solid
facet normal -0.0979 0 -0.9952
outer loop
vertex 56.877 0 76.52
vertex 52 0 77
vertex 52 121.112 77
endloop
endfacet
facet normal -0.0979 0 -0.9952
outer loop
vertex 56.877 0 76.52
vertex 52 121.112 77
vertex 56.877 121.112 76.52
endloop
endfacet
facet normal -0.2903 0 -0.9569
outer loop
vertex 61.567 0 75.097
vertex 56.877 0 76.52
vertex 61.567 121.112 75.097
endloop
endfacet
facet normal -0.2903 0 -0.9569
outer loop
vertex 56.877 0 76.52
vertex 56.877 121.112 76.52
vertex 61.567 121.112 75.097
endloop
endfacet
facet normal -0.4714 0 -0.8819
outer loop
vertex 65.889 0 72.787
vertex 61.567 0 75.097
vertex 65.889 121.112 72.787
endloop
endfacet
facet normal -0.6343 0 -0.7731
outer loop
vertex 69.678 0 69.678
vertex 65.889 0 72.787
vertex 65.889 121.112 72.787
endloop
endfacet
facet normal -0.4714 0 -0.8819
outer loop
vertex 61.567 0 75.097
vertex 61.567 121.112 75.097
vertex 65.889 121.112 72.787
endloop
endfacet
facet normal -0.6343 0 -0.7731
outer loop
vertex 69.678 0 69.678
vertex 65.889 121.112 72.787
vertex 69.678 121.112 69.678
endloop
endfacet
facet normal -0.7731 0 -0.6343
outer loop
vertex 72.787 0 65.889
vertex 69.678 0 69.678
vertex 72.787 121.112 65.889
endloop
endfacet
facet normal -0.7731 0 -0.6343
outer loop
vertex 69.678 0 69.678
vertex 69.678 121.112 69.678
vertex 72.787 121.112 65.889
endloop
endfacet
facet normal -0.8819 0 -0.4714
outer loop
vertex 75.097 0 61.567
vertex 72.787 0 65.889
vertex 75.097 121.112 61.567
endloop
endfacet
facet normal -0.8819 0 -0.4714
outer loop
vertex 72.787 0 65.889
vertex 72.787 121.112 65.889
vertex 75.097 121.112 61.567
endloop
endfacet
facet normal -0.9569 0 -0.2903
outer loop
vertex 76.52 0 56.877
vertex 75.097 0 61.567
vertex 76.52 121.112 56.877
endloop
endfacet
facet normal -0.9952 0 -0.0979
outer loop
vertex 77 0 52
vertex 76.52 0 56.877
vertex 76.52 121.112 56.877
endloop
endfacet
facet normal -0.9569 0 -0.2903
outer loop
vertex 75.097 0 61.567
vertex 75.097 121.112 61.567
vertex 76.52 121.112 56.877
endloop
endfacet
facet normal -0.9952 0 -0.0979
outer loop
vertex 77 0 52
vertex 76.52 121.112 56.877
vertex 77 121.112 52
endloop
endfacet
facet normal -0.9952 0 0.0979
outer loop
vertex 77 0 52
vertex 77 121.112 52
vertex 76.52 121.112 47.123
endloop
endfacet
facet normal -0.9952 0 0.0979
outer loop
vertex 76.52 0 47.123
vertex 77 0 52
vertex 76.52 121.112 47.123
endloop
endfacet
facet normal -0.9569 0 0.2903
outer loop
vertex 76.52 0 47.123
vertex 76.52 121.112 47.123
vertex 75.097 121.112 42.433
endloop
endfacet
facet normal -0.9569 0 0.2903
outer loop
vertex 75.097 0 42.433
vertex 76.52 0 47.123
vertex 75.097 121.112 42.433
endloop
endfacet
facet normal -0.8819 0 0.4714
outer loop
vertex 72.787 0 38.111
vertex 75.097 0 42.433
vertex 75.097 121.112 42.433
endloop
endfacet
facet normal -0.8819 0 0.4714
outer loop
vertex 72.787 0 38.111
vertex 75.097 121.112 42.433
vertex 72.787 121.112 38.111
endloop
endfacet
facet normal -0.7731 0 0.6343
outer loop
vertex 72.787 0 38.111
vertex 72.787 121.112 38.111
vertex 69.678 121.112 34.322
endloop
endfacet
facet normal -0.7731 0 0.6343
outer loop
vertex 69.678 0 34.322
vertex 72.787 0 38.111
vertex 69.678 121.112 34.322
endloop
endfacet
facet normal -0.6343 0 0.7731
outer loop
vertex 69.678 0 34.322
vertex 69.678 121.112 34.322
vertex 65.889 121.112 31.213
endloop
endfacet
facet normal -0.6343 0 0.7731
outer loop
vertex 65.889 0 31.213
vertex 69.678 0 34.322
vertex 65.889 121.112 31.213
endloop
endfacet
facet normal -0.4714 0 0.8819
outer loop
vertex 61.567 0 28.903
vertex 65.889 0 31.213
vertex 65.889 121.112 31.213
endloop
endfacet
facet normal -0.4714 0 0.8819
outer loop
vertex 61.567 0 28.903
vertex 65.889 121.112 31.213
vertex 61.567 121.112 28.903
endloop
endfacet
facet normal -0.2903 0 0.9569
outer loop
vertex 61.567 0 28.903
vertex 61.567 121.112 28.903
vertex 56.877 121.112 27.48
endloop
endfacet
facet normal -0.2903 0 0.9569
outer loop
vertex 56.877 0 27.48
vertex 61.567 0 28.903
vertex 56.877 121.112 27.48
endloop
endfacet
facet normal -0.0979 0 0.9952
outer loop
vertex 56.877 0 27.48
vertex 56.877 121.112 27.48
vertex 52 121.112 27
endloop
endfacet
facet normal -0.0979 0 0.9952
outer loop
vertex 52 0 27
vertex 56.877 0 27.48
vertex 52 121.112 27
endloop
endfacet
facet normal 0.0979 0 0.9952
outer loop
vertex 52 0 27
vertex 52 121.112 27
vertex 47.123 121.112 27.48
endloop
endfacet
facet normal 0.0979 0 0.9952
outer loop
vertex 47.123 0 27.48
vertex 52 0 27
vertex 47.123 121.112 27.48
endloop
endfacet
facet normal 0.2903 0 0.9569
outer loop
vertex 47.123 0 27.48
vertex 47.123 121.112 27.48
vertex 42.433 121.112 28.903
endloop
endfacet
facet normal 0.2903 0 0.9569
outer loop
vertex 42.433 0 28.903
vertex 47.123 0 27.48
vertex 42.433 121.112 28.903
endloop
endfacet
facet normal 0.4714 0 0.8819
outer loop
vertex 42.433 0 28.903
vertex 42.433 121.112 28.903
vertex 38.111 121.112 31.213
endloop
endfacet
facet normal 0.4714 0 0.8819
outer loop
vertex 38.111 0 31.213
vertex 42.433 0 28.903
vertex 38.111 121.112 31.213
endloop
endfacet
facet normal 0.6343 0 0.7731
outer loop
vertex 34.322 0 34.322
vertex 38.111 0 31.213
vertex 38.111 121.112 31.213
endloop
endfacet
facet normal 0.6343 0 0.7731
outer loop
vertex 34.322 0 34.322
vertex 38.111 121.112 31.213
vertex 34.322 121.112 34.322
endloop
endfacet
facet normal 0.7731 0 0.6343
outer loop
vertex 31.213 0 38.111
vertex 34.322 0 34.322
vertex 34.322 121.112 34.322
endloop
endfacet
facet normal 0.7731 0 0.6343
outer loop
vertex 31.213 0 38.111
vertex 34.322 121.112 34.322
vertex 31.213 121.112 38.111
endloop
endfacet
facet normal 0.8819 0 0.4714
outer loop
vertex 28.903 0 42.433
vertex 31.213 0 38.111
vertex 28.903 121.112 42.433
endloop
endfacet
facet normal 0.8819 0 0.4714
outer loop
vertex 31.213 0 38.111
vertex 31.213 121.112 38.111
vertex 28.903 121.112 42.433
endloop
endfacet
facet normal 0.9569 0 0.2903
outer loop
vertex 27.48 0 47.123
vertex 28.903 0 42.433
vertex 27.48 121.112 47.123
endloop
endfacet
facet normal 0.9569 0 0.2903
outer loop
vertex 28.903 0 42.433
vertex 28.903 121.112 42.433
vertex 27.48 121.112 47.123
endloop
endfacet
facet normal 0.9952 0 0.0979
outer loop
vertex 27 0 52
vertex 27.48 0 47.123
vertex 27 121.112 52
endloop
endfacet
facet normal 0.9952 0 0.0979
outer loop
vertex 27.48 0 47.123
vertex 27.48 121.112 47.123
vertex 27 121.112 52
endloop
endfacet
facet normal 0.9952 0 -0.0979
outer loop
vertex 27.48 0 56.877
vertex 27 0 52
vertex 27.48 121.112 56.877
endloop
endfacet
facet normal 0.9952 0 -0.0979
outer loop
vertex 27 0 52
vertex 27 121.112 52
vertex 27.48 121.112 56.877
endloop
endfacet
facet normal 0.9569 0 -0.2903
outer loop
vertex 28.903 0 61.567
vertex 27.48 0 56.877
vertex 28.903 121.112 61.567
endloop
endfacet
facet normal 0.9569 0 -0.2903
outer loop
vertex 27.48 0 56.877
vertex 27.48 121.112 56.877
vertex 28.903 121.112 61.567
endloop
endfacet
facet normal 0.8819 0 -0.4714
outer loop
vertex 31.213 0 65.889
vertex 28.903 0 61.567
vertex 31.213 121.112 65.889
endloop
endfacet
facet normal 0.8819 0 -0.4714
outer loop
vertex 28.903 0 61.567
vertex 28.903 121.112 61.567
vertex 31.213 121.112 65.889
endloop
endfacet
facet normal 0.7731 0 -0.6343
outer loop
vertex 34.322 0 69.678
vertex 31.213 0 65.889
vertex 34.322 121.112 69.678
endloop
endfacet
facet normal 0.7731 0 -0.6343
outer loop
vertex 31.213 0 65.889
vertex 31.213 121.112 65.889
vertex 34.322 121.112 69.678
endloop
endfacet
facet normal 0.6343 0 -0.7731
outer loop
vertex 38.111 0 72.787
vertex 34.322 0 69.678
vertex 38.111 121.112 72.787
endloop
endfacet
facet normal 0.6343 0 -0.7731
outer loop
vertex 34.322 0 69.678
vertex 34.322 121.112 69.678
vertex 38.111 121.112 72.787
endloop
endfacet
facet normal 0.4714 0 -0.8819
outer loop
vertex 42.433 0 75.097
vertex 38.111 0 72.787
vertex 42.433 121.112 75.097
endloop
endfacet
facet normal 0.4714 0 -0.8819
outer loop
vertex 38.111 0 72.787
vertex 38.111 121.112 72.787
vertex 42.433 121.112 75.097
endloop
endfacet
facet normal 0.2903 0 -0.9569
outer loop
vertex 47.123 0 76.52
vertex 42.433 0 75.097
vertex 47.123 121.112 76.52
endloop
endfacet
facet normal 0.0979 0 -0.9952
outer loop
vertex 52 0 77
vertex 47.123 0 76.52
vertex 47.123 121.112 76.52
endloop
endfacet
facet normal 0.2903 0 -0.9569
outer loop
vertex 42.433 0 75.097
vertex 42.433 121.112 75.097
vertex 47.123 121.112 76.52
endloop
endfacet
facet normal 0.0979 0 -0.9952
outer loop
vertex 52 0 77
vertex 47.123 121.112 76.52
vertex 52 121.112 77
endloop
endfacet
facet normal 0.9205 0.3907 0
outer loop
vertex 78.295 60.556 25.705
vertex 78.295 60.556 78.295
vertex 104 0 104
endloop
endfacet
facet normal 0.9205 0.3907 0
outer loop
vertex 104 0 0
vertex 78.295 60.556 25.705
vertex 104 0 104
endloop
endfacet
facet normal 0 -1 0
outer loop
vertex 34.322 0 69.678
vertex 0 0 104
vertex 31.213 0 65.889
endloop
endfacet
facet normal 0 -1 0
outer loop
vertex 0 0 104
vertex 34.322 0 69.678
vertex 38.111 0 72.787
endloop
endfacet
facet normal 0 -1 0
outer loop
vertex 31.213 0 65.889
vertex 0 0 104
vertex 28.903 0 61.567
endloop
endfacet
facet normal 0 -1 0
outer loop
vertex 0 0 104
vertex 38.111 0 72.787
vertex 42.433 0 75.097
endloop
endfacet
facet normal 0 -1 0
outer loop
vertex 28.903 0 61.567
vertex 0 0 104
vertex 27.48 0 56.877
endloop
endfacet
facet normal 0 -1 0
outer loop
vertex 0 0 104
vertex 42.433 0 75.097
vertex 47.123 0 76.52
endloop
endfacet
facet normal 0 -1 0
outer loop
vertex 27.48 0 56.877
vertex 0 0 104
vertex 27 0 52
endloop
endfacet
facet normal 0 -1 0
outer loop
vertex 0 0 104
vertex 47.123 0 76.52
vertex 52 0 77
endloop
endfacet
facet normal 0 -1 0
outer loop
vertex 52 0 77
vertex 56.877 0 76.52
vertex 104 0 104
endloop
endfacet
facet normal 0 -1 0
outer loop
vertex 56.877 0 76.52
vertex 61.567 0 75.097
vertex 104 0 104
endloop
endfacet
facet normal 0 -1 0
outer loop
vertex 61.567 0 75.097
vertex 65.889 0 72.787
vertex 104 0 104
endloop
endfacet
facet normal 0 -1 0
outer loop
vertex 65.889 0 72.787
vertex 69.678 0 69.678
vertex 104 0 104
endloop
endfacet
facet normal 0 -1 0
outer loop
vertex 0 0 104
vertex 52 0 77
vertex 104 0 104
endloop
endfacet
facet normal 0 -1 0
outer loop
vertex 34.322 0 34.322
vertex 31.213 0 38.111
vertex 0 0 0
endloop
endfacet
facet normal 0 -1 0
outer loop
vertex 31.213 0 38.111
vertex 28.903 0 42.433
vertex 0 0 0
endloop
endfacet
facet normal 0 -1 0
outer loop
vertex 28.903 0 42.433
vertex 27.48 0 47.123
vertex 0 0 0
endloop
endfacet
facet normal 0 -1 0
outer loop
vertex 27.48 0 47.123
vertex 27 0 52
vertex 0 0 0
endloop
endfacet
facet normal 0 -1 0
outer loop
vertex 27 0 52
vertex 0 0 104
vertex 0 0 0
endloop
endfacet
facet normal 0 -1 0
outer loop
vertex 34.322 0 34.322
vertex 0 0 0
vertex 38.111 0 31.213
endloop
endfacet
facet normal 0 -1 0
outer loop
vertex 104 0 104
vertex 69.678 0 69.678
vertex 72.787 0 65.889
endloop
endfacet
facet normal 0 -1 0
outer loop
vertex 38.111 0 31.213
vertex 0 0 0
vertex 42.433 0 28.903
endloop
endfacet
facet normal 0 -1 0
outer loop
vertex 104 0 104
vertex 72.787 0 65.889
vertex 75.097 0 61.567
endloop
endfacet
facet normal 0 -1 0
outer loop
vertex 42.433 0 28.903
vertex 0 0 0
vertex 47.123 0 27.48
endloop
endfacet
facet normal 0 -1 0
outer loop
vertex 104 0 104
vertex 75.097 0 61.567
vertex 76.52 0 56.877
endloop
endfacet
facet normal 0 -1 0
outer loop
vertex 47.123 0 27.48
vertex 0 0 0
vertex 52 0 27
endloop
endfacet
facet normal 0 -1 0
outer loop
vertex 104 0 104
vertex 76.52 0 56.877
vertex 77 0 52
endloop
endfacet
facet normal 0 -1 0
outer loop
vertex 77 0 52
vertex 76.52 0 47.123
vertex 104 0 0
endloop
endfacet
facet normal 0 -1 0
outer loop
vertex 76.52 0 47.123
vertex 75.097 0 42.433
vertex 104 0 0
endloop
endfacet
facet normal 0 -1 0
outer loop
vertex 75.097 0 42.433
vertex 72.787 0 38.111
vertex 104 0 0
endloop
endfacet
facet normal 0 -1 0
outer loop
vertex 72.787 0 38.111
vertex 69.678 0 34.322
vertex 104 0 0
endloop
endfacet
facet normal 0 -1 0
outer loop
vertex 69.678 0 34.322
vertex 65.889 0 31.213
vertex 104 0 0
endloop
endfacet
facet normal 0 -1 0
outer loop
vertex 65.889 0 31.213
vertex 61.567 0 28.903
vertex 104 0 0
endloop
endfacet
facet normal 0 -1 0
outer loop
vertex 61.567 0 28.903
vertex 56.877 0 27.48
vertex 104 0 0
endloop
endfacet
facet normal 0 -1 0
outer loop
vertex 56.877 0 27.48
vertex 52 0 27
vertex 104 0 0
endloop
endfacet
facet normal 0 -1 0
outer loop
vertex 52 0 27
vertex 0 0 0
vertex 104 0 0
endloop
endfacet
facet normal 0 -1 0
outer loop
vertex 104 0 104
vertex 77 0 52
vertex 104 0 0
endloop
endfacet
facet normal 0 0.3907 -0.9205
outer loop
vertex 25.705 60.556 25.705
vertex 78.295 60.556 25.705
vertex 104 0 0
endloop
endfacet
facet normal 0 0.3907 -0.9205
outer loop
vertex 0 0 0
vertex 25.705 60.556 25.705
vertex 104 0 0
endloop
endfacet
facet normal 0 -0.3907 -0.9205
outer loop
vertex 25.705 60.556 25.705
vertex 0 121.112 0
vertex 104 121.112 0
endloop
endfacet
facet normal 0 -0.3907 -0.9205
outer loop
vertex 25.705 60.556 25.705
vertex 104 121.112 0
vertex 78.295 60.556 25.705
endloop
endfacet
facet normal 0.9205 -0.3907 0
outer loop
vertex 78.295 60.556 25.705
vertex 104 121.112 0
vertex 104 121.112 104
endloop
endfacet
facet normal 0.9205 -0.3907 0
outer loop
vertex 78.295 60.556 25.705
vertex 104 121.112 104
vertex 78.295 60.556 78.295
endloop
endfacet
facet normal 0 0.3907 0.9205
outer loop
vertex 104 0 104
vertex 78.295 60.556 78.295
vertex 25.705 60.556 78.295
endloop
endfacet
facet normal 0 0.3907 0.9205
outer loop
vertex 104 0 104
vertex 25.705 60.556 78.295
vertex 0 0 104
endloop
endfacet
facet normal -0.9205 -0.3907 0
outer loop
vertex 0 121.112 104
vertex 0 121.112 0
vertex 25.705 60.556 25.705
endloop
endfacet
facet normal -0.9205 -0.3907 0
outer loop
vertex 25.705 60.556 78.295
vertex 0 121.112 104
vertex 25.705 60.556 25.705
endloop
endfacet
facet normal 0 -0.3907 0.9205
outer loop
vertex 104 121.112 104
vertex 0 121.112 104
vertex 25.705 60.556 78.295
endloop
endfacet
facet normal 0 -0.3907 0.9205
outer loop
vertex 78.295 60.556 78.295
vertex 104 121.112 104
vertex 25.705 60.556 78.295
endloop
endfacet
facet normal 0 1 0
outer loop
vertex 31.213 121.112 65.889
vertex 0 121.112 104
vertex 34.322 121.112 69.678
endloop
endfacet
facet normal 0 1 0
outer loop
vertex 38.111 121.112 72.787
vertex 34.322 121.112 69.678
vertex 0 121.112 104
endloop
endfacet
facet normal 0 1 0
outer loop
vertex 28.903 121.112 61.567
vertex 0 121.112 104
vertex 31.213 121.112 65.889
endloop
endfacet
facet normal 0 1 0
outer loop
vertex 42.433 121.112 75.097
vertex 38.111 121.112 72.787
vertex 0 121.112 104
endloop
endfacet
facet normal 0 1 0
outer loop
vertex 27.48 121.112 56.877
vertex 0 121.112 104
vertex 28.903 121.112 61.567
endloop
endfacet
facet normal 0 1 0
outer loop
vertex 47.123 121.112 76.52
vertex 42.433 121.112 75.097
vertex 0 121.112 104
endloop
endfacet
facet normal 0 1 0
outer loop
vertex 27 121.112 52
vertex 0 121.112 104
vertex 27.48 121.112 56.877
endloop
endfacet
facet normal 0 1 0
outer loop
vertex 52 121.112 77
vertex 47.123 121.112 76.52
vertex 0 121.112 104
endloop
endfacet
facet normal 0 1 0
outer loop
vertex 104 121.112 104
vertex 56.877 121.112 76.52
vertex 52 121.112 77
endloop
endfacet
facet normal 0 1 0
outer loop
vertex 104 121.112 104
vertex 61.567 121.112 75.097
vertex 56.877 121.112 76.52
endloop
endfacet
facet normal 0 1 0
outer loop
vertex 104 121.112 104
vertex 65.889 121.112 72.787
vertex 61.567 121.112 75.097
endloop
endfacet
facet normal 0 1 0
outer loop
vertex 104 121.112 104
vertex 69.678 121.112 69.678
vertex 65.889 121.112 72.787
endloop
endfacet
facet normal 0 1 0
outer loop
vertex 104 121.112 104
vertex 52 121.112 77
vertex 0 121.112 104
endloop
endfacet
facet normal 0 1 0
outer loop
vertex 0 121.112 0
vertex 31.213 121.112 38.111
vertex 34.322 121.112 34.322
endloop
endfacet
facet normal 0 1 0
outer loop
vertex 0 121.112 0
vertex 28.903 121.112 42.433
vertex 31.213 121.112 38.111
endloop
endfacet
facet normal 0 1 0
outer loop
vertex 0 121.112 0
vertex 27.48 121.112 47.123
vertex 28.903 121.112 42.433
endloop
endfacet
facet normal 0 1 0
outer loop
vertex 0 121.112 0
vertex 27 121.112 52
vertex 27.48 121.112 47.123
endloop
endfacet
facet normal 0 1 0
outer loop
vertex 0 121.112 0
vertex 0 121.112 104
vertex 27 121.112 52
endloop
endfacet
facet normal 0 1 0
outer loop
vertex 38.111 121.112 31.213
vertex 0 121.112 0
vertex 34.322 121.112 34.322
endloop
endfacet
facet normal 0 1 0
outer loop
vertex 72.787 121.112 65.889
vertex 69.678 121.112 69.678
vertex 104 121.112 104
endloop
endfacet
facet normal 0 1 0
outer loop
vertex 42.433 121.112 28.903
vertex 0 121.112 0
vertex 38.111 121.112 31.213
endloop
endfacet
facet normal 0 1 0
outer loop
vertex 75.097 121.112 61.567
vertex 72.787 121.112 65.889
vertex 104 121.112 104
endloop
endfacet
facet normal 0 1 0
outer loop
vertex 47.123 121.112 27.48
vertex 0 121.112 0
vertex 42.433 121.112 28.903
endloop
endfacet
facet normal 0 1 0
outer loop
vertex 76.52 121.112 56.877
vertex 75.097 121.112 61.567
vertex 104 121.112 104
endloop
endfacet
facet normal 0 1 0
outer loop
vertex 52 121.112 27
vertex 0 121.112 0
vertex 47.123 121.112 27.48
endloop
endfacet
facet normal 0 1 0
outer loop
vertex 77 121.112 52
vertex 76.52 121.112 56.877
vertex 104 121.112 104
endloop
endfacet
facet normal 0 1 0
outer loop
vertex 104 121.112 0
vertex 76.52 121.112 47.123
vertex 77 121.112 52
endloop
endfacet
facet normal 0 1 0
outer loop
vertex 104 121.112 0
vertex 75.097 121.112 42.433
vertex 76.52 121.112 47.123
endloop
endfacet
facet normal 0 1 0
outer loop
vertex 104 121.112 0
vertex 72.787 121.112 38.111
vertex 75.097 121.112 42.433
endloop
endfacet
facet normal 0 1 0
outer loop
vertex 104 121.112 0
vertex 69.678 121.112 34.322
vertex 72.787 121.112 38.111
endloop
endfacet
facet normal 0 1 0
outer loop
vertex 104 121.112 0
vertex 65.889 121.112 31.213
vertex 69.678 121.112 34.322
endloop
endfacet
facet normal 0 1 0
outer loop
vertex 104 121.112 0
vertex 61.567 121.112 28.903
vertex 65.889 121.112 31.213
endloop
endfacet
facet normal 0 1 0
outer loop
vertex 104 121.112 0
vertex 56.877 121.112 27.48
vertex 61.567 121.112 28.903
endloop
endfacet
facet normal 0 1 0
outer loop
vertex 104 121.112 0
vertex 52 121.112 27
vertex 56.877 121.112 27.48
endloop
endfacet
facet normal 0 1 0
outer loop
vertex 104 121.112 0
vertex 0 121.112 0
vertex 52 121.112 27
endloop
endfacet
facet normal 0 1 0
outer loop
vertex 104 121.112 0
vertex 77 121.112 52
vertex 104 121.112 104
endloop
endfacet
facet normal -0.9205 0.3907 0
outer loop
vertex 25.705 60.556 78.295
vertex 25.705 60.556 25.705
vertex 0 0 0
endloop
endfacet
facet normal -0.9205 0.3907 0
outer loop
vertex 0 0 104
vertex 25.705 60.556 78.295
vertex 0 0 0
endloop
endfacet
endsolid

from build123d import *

# Parameters (mm, degrees)
SKETCH1_W           = 104
SKETCH1_H           = 121.112050925
BOSS_EXTRUDE1_DEPTH = 104
CUT_EXTRUDE1_DEPTH  = 104
CUT_EXTRUDE2_DEPTH  = 104
CUT_EXTRUDE3_DEPTH  = 191.525927053
CUT_EXTRUDE4_DEPTH  = 191.525927053
SKETCH6_R           = 25
CUT_EXTRUDE5_DEPTH  = 191.525927053


with BuildPart() as part:
    # Sketch1 → Boss-Extrude1 (new body)
    with BuildSketch(Plane.XY):
        with Locations((52, 60.556025463)):
            Rectangle(SKETCH1_W, SKETCH1_H)
    extrude(amount=BOSS_EXTRUDE1_DEPTH)

    # Sketch2 → Cut-Extrude1 (cut)
    with BuildSketch(Plane(origin=(0, 0, 0), x_dir=(-1, 0, 0), z_dir=(0, 0, -1))):
        Polygon((0, 121.112050925), (-25.704507779, 60.556025463), (0, 0), align=None)
    extrude(amount=-CUT_EXTRUDE1_DEPTH, mode=Mode.SUBTRACT)

    # Sketch3 → Cut-Extrude2 (cut)
    with BuildSketch(Plane(origin=(0, 0, 0), x_dir=(-1, 0, 0), z_dir=(0, 0, -1))):
        Polygon((-104, 121.112050925), (-78.295492221, 60.556025463), (-104, 0), align=None)
    extrude(amount=-CUT_EXTRUDE2_DEPTH, mode=Mode.SUBTRACT)

    # Sketch4 → Cut-Extrude3 (cut, through all)
    with BuildSketch(Plane(origin=(0, 0, 0), x_dir=(0, 0, -1), z_dir=(1, 0, 0))):
        Polygon((-104, 121.112050925), (-78.295492221, 60.556025463), (-104, 0), align=None)
    extrude(amount=CUT_EXTRUDE3_DEPTH, mode=Mode.SUBTRACT)

    # Sketch5 → Cut-Extrude4 (cut, through all)
    with BuildSketch(Plane(origin=(0, 0, 0), x_dir=(0, 0, -1), z_dir=(1, 0, 0))):
        Polygon((0, 121.112050925), (-25.704507779, 60.556025463), (0, 0), align=None)
    extrude(amount=CUT_EXTRUDE4_DEPTH, mode=Mode.SUBTRACT)

    # Sketch6 → Cut-Extrude5 (cut, through all)
    with BuildSketch(Plane(origin=(0, 121.112050925, 0), x_dir=(1, 0, 0), z_dir=(0, 1, 0))):
        with Locations(Location((52, -52, 0), (0, 0, 270))):
            Circle(SKETCH6_R)
    extrude(amount=-CUT_EXTRUDE5_DEPTH, mode=Mode.SUBTRACT)


solid = part.part
